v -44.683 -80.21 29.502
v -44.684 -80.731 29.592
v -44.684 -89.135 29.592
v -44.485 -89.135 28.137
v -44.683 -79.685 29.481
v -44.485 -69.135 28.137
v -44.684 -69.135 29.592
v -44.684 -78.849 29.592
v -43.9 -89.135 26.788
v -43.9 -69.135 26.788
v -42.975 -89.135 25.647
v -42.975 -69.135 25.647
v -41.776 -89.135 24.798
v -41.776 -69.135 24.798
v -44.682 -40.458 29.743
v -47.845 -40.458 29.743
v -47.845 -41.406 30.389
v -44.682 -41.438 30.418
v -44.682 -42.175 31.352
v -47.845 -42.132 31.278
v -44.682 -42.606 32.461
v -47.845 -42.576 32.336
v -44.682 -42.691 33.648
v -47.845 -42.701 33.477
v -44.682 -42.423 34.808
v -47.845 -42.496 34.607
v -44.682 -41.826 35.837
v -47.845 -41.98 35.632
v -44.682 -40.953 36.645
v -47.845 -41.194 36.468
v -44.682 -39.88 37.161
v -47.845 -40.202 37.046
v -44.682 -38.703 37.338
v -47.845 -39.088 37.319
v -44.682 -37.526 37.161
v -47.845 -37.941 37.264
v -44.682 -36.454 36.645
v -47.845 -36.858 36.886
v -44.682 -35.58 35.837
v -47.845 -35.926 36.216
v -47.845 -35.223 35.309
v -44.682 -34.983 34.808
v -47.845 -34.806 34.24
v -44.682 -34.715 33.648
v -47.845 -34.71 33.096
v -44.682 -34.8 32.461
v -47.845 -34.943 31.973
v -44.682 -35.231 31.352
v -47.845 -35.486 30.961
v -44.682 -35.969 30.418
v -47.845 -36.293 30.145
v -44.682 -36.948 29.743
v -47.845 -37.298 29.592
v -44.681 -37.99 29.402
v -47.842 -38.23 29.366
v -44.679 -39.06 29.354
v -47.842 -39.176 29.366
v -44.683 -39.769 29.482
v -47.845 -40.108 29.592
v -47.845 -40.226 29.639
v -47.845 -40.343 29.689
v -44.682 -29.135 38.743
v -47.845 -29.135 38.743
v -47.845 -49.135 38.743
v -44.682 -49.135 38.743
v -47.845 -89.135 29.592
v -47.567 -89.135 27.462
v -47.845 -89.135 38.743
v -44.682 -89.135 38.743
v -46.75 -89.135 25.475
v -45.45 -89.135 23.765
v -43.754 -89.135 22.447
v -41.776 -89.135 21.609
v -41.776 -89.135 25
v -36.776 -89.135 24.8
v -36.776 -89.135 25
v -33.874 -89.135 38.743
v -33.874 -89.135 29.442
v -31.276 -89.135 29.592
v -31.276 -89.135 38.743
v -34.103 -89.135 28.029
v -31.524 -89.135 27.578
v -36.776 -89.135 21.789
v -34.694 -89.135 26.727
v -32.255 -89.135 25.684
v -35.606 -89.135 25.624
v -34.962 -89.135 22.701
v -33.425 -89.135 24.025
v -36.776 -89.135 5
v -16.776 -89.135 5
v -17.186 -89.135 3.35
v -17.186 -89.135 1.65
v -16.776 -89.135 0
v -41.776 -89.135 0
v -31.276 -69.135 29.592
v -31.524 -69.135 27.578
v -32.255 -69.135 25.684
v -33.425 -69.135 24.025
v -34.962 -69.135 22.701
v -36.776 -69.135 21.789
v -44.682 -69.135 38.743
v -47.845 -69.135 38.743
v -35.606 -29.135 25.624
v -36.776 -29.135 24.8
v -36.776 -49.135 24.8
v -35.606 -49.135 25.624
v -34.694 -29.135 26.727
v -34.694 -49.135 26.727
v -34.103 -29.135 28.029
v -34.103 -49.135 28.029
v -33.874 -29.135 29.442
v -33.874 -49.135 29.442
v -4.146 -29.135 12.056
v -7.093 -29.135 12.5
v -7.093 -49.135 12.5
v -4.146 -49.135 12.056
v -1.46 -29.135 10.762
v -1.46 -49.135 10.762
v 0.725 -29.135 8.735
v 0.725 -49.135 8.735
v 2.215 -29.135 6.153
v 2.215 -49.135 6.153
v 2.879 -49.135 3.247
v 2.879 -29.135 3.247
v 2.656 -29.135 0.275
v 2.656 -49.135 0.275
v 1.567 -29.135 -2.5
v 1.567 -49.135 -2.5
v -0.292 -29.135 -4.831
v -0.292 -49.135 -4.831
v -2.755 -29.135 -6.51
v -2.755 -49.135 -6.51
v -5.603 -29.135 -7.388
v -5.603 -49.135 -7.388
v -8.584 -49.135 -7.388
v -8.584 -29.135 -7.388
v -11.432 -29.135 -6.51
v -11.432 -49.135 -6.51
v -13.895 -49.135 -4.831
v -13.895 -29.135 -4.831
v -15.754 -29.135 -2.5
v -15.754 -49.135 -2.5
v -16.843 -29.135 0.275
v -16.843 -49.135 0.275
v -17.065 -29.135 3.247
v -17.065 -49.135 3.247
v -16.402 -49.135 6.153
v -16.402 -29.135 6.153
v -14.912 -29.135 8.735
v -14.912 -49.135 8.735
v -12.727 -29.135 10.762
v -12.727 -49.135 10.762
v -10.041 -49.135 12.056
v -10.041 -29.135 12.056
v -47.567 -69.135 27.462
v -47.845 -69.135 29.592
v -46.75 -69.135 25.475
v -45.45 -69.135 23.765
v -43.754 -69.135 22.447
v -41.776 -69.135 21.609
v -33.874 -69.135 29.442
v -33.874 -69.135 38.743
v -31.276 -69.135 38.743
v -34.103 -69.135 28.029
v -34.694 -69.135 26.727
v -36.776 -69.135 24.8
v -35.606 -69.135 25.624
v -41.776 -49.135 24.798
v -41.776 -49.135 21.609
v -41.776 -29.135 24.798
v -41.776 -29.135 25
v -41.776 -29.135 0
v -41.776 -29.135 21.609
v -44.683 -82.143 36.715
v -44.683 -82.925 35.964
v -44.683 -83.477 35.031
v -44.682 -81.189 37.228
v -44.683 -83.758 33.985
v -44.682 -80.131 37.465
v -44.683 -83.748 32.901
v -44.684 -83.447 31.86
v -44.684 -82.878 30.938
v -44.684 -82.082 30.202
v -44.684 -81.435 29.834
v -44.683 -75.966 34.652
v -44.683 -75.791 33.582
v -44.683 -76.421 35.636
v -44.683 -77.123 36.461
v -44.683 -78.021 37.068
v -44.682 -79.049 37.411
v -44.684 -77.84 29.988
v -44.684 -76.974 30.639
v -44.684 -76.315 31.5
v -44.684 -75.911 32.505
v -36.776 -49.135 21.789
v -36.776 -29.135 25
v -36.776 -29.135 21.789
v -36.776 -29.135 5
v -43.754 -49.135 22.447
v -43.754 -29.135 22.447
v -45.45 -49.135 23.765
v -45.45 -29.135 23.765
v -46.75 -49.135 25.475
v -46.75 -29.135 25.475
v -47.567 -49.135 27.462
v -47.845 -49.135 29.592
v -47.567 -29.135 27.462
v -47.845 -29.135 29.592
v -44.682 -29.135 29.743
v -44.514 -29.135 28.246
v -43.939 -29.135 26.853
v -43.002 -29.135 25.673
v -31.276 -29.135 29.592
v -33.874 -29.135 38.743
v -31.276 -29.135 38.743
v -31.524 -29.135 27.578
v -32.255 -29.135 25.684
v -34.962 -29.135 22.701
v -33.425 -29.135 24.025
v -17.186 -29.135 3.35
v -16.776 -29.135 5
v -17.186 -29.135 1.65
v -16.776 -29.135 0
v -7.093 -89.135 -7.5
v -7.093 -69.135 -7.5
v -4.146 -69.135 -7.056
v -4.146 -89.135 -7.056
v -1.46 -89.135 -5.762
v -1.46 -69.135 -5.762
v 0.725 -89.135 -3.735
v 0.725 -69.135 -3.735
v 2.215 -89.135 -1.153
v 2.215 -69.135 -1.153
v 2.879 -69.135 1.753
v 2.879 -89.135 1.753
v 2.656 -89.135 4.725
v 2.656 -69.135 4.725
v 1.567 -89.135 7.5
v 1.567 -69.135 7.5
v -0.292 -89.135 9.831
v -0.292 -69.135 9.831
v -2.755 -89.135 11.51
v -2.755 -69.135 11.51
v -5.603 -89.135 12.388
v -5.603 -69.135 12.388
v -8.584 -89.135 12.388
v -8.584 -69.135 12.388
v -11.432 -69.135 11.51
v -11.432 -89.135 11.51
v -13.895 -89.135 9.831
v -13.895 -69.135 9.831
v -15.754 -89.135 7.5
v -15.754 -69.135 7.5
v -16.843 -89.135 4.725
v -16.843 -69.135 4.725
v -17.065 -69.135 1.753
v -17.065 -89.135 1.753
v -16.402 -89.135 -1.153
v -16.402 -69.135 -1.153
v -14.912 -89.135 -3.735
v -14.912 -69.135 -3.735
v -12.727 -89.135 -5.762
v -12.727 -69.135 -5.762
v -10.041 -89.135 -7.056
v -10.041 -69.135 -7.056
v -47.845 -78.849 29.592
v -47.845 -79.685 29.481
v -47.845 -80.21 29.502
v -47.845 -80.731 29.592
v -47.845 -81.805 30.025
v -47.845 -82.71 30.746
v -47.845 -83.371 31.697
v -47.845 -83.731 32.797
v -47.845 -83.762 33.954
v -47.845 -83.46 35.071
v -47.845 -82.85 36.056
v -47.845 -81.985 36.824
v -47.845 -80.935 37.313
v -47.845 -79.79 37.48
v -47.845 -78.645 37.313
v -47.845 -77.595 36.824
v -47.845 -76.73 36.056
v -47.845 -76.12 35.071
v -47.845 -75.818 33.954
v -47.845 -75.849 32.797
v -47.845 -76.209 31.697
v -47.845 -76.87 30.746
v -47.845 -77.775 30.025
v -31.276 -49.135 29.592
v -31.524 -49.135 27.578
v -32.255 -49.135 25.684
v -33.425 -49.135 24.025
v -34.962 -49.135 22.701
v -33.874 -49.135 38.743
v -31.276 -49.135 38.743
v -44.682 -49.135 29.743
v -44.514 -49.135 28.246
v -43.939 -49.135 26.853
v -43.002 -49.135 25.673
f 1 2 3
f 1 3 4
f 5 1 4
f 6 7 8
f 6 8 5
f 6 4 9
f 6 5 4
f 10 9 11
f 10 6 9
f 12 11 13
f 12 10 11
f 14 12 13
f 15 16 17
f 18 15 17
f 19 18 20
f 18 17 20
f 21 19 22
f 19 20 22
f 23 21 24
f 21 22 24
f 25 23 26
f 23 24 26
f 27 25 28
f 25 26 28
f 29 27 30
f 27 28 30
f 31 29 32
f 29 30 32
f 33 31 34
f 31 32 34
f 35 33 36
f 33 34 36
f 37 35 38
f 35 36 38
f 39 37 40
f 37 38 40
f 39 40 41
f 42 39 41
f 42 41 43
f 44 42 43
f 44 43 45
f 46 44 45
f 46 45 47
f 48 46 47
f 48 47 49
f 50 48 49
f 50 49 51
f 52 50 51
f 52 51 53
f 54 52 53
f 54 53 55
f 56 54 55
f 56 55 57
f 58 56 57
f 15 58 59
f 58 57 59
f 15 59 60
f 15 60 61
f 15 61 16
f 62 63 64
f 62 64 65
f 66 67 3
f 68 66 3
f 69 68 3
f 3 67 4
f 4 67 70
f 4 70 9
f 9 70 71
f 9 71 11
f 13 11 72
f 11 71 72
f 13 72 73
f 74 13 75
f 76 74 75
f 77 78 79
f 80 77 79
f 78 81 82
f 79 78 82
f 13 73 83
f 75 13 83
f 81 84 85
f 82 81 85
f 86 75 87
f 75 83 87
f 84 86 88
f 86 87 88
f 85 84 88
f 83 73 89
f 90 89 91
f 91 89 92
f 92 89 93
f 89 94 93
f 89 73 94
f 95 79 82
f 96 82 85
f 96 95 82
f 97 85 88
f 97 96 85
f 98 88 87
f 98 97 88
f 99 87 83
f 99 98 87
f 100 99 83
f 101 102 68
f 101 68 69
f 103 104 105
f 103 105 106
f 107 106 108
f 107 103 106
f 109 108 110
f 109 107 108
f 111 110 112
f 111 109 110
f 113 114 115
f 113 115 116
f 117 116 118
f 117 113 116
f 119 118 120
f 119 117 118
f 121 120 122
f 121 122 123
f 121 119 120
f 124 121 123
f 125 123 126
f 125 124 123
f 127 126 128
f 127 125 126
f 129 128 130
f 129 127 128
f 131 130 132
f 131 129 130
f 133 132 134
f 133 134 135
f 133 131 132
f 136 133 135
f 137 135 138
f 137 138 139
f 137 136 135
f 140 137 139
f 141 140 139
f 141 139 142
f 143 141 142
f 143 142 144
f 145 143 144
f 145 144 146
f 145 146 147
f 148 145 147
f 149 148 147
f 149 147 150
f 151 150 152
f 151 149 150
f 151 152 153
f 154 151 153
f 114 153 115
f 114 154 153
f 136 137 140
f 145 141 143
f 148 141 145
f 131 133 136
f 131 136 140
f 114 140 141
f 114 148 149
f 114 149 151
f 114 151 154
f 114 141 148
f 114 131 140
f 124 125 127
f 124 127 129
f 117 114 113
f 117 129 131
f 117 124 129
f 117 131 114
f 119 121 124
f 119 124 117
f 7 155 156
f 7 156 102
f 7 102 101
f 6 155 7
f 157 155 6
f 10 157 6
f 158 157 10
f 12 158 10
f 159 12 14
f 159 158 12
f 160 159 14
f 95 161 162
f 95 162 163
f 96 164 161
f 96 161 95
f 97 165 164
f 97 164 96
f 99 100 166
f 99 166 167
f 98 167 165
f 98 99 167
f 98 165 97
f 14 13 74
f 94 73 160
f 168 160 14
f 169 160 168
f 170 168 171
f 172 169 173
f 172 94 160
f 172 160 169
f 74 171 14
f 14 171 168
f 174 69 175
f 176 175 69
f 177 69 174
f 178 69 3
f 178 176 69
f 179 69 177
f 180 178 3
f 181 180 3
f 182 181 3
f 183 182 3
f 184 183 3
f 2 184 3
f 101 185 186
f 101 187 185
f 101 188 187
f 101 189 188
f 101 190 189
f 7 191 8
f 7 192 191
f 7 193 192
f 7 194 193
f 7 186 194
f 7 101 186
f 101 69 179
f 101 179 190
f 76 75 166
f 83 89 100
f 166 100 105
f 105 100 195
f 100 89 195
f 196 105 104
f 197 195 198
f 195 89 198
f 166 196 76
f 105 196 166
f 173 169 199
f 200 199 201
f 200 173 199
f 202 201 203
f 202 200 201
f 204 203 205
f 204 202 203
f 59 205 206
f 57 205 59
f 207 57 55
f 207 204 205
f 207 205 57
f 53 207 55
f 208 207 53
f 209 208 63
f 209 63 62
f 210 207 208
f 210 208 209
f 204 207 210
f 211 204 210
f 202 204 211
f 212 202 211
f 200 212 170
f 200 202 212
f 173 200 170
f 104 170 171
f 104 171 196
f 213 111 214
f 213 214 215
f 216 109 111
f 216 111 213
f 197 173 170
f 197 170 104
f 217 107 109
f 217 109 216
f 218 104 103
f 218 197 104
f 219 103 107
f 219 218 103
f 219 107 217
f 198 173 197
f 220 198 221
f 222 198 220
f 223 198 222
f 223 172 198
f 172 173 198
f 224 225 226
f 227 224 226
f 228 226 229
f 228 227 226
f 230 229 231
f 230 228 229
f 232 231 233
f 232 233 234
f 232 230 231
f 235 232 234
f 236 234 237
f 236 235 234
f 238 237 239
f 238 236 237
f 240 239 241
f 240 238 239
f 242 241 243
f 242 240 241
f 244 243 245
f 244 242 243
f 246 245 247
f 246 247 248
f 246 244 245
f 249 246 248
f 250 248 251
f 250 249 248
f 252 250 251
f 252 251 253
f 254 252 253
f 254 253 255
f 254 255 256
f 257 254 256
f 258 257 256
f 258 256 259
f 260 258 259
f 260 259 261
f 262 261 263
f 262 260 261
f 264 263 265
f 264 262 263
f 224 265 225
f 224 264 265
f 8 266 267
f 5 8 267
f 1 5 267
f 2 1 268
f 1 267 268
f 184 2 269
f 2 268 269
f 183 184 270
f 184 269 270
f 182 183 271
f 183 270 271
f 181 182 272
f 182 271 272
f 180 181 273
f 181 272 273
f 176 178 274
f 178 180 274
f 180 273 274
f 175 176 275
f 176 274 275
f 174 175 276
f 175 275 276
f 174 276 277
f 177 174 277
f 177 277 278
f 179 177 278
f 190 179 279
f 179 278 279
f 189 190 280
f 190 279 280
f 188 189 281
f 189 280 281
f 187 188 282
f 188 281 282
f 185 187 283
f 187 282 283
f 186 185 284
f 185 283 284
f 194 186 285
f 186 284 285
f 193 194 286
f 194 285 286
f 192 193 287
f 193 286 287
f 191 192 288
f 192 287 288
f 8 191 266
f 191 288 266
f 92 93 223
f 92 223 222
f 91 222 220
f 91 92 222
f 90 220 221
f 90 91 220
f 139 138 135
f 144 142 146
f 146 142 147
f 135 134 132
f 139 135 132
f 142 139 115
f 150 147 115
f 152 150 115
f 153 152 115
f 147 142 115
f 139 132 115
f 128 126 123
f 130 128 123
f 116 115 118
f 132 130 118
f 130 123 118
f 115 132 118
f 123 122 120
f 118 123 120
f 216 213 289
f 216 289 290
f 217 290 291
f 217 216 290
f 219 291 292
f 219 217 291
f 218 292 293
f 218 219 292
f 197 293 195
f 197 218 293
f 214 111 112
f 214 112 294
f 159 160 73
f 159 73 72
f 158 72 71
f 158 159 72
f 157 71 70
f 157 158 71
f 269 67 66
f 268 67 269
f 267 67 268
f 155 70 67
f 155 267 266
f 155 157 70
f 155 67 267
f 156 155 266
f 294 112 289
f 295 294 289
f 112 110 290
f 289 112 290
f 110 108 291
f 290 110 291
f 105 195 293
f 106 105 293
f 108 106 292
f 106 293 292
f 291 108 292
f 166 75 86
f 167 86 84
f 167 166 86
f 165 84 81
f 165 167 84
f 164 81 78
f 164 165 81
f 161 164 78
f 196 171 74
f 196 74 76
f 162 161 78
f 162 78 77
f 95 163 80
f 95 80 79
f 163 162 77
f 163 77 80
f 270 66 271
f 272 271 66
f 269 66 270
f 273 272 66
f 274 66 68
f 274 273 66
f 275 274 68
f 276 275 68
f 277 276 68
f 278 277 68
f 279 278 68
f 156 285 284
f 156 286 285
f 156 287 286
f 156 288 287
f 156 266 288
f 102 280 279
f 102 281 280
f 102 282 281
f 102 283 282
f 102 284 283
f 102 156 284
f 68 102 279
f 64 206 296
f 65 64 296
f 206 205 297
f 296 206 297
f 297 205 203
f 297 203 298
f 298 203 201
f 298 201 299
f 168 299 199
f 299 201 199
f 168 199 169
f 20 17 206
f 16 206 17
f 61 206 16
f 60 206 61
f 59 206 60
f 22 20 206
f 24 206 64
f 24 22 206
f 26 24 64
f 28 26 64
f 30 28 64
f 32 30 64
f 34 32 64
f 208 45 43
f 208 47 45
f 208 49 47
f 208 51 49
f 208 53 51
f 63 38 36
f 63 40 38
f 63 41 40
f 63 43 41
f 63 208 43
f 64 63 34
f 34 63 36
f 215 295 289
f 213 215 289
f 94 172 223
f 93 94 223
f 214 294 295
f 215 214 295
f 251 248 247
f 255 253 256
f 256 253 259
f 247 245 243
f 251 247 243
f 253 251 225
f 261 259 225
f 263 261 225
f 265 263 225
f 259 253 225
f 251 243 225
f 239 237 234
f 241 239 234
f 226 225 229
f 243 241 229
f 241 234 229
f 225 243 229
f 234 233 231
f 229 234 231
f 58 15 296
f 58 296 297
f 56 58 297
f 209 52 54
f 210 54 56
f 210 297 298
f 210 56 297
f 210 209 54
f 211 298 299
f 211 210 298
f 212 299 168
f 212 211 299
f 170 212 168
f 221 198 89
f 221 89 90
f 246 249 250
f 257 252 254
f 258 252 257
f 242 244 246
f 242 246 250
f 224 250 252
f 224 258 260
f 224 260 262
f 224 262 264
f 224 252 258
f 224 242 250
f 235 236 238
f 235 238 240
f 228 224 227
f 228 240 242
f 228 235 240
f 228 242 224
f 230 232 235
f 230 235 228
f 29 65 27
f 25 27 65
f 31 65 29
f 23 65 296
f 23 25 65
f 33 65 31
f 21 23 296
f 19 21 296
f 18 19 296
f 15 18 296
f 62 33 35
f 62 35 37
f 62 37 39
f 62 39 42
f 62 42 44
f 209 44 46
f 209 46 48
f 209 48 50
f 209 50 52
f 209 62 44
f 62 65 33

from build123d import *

# Parameters (mm, degrees)
SKETCH1_W               = 120
SKETCH1_H               = 60
BOSS_EXTRUDE4_DEPTH     = 5
CUT_EXTRUDE3_DEPTH      = 150.441021831
CUT_EXTRUDE3_DEPTH_BACK = 60
SKETCH18_R              = 10
BOSS_EXTRUDE9_DEPTH     = 20
SKETCH19_R              = 10
BOSS_EXTRUDE10_DEPTH    = 20
SKETCH20_W              = 95
SKETCH20_H              = 5
CUT_EXTRUDE4_DEPTH      = 100
SKETCH21_W              = 5
SKETCH21_H              = 60
BOSS_EXTRUDE11_DEPTH    = 20
BOSS_EXTRUDE12_DEPTH    = 20
BOSS_EXTRUDE13_START    = -20
BOSS_EXTRUDE13_DEPTH    = 20
SKETCH25_R              = 4
CUT_EXTRUDE5_DEPTH      = 5
SKETCH26_R              = 4
CUT_EXTRUDE6_DEPTH      = 5


with BuildPart() as part:
    # Sketch1 → Boss-Extrude4 (new body)
    with BuildSketch(Plane.XY):
        with Locations((-76.775798319, -59.134789916)):
            Rectangle(SKETCH1_W, SKETCH1_H)
    extrude(amount=BOSS_EXTRUDE4_DEPTH)

    # Sketch6 → Cut-Extrude3 (cut, two sides: drawn at the far end of the back side and taken through both)
    with BuildSketch(Plane(origin=(0, -29.134789916, 0), x_dir=(1, 0, 0), z_dir=(0, 1, 0)).offset(-CUT_EXTRUDE3_DEPTH_BACK)):
        with BuildLine():
            Line((72.584288463, 233.706952721), (-16.775798319, 0))
            ThreePointArc((-16.775798319, 0), (-17.237449904, -2.5), (-16.775798319, -5))
            Line((-16.775798319, -5), (72.584288463, -238.706952721))
            Line((72.584288463, -238.706952721), (573.000774441, -238.706952721))
            Line((573.000774441, -238.706952721), (573.000774441, 233.706952721))
            Line((573.000774441, 233.706952721), (72.584288463, 233.706952721))
        make_face()
    extrude(amount=CUT_EXTRUDE3_DEPTH + CUT_EXTRUDE3_DEPTH_BACK, mode=Mode.SUBTRACT)

    # Sketch20 → Cut-Extrude4 (cut)
    with BuildSketch(Plane(origin=(0, -29.134789916, 0), x_dir=(1, 0, 0), z_dir=(0, 1, 0))):
        with Locations((-89.275798319, -2.5)):
            Rectangle(SKETCH20_W, SKETCH20_H)
    extrude(amount=-CUT_EXTRUDE4_DEPTH, mode=Mode.SUBTRACT)

    # Sketch21 → Boss-Extrude11 (add)
    with BuildSketch(Plane.XY.offset(5)):
        with Locations((-39.275798319, -59.134789916)):
            Rectangle(SKETCH21_W, SKETCH21_H)
    extrude(amount=BOSS_EXTRUDE11_DEPTH)

    # Sketch22 → Boss-Extrude12 (add)
    with BuildSketch(Plane(origin=(0, -29.134789916, 0), x_dir=(1, 0, 0), z_dir=(0, 1, 0))):
        with BuildLine():
            Line((-47.845488891, -29.592327144), (-47.845488891, -38.743441952))
            Line((-47.845488891, -38.743441952), (-44.682140563, -38.743441952))
            Line((-44.682140563, -38.743441952), (-44.682140563, -29.742962779))
            ThreePointArc((-44.682140563, -29.742962779), (-39.428722802, -24.188273749), (-33.874033773, -29.44169151))
            Line((-33.874033773, -29.44169151), (-33.874033773, -38.743441952))
            Line((-33.874033773, -38.743441952), (-31.275569074, -38.743441952))
            Line((-31.275569074, -38.743441952), (-31.275569074, -29.592327144))
            ThreePointArc((-31.275569074, -29.592327144), (-39.560528983, -21.307367236), (-47.845488891, -29.592327144))
        make_face()
    extrude(amount=-BOSS_EXTRUDE12_DEPTH)

    # Sketch24 → Boss-Extrude13 (add)
    with BuildSketch(Plane(origin=(0, -89.134789916, 0), x_dir=(-1, 0, 0), z_dir=(0, -1, 0)).offset(BOSS_EXTRUDE13_START)):
        with BuildLine():
            Line((47.845488891, -29.592327144), (47.845488891, -38.743441952))
            Line((47.845488891, -38.743441952), (44.682140563, -38.743441952))
            Line((44.682140563, -38.743441952), (44.684239606, -29.592327144))
            ThreePointArc((44.684239606, -29.592327144), (39.353412297, -24.186699492), (33.874033773, -29.44169151))
            Line((33.874033773, -29.44169151), (33.874033773, -38.743441952))
            Line((33.874033773, -38.743441952), (31.275569074, -38.743441952))
            Line((31.275569074, -38.743441952), (31.275569074, -29.592327144))
            ThreePointArc((31.275569074, -29.592327144), (39.560528983, -21.307367236), (47.845488891, -29.592327144))
        make_face()
    extrude(amount=BOSS_EXTRUDE13_DEPTH)

    # Sketch25 → Cut-Extrude5 (cut)
    with BuildSketch(Plane.ZY.offset(47.845488891)):
        with Locations(Location((33.337580104, -38.703120712, 0), (0, 0, 206.018255013))):
            Circle(SKETCH25_R)
    extrude(amount=-CUT_EXTRUDE5_DEPTH, mode=Mode.SUBTRACT)

    # Sketch26 → Cut-Extrude6 (cut)
    with BuildSketch(Plane.ZY.offset(47.845488891)):
        with Locations(Location((33.479995175, -79.79002853, 0), (0, 0, 166.389284615))):
            Circle(SKETCH26_R)
    extrude(amount=-CUT_EXTRUDE6_DEPTH, mode=Mode.SUBTRACT)


with BuildPart() as body_2:
    # Sketch18 → Boss-Extrude9 (new body)
    with BuildSketch(Plane(origin=(0, -29.134789916, 0), x_dir=(1, 0, 0), z_dir=(0, 1, 0))):
        with Locations(Location((-7.093339954, -2.5, 0), (0, 0, 270))):
            Circle(SKETCH18_R)
    extrude(amount=-BOSS_EXTRUDE9_DEPTH)


with BuildPart() as body_3:
    # Sketch19 → Boss-Extrude10 (new body)
    with BuildSketch(Plane.XZ.offset(89.134789916)):
        with Locations(Location((-7.093339954, 2.5, 0), (0, 0, 270))):
            Circle(SKETCH19_R)
    extrude(amount=-BOSS_EXTRUDE10_DEPTH)


solid = Compound([part.part, body_2.part, body_3.part])
